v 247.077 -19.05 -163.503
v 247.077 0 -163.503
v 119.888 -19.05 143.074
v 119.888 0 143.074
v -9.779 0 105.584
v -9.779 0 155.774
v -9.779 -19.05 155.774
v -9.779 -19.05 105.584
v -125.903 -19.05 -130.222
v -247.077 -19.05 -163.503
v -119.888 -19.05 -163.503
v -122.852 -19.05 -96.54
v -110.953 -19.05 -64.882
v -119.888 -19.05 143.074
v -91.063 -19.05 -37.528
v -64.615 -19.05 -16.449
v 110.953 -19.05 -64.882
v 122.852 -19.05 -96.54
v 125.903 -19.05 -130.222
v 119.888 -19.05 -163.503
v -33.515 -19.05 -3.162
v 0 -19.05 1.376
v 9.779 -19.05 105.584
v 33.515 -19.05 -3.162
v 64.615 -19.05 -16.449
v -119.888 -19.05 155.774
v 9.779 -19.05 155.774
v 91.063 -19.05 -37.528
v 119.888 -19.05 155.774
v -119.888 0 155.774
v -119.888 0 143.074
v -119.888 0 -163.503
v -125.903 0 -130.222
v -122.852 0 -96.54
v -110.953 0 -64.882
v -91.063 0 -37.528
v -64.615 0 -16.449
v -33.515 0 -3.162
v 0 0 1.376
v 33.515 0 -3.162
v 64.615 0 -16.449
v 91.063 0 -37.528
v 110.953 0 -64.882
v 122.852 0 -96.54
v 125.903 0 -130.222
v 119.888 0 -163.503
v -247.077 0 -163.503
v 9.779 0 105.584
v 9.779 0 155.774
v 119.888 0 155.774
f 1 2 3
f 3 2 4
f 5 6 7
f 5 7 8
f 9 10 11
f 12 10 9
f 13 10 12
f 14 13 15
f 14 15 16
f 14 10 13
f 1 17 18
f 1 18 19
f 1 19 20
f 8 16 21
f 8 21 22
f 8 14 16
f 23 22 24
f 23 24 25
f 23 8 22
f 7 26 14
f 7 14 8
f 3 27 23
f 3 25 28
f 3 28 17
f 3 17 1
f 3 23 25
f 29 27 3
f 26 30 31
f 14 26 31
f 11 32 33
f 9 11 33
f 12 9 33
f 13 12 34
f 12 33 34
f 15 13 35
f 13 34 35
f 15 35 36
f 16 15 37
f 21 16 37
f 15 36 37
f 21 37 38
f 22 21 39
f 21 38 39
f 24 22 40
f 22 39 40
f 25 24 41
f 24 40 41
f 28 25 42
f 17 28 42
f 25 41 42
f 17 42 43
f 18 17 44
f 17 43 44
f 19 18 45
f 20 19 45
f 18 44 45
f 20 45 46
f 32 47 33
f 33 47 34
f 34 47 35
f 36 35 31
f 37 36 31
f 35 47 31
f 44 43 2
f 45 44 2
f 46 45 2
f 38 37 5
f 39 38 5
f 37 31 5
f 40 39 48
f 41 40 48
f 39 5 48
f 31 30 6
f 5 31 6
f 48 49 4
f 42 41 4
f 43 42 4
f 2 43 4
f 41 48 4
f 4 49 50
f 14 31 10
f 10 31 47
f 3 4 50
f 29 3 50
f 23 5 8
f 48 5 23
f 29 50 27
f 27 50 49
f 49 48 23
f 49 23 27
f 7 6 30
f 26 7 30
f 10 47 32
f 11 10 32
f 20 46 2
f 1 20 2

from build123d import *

# Parameters (mm, degrees)
F1_DEPTH = 19.05
F3_DEPTH = 19.05


with BuildPart() as f1:
    # F0 (on Front) → F1 (new body)
    with BuildSketch(Plane.XZ):
        with BuildLine():
            Line((119.888, 155.774192), (0, 155.774192))
            Line((0, 155.774192), (-119.888, 155.774192))
            Line((-119.888, 155.774192), (-119.888, 143.074192))
            Line((-119.888, 143.074192), (-247.076714, -163.503496))
            Line((-247.076714, -163.503496), (-119.888, -163.503496))
            ThreePointArc((-119.888, -163.503496), (0, 1.376312), (119.888, -163.503496))
            Line((119.888, -163.503496), (247.076714, -163.503496))
            Line((247.076714, -163.503496), (119.888, 143.074192))
            Line((119.888, 143.074192), (119.888, 155.774192))
        make_face()
    extrude(amount=F1_DEPTH)

    # F2 (on Front) → F3 (cut)
    with BuildSketch(Plane.XZ):
        Polygon((-9.779, 105.583792), (0, 105.583792), (9.779, 105.583792), (9.779, 155.774192), (0, 155.774192), (-9.779, 155.774192), align=None)
    extrude(amount=F3_DEPTH, mode=Mode.SUBTRACT)


solid = f1.part
